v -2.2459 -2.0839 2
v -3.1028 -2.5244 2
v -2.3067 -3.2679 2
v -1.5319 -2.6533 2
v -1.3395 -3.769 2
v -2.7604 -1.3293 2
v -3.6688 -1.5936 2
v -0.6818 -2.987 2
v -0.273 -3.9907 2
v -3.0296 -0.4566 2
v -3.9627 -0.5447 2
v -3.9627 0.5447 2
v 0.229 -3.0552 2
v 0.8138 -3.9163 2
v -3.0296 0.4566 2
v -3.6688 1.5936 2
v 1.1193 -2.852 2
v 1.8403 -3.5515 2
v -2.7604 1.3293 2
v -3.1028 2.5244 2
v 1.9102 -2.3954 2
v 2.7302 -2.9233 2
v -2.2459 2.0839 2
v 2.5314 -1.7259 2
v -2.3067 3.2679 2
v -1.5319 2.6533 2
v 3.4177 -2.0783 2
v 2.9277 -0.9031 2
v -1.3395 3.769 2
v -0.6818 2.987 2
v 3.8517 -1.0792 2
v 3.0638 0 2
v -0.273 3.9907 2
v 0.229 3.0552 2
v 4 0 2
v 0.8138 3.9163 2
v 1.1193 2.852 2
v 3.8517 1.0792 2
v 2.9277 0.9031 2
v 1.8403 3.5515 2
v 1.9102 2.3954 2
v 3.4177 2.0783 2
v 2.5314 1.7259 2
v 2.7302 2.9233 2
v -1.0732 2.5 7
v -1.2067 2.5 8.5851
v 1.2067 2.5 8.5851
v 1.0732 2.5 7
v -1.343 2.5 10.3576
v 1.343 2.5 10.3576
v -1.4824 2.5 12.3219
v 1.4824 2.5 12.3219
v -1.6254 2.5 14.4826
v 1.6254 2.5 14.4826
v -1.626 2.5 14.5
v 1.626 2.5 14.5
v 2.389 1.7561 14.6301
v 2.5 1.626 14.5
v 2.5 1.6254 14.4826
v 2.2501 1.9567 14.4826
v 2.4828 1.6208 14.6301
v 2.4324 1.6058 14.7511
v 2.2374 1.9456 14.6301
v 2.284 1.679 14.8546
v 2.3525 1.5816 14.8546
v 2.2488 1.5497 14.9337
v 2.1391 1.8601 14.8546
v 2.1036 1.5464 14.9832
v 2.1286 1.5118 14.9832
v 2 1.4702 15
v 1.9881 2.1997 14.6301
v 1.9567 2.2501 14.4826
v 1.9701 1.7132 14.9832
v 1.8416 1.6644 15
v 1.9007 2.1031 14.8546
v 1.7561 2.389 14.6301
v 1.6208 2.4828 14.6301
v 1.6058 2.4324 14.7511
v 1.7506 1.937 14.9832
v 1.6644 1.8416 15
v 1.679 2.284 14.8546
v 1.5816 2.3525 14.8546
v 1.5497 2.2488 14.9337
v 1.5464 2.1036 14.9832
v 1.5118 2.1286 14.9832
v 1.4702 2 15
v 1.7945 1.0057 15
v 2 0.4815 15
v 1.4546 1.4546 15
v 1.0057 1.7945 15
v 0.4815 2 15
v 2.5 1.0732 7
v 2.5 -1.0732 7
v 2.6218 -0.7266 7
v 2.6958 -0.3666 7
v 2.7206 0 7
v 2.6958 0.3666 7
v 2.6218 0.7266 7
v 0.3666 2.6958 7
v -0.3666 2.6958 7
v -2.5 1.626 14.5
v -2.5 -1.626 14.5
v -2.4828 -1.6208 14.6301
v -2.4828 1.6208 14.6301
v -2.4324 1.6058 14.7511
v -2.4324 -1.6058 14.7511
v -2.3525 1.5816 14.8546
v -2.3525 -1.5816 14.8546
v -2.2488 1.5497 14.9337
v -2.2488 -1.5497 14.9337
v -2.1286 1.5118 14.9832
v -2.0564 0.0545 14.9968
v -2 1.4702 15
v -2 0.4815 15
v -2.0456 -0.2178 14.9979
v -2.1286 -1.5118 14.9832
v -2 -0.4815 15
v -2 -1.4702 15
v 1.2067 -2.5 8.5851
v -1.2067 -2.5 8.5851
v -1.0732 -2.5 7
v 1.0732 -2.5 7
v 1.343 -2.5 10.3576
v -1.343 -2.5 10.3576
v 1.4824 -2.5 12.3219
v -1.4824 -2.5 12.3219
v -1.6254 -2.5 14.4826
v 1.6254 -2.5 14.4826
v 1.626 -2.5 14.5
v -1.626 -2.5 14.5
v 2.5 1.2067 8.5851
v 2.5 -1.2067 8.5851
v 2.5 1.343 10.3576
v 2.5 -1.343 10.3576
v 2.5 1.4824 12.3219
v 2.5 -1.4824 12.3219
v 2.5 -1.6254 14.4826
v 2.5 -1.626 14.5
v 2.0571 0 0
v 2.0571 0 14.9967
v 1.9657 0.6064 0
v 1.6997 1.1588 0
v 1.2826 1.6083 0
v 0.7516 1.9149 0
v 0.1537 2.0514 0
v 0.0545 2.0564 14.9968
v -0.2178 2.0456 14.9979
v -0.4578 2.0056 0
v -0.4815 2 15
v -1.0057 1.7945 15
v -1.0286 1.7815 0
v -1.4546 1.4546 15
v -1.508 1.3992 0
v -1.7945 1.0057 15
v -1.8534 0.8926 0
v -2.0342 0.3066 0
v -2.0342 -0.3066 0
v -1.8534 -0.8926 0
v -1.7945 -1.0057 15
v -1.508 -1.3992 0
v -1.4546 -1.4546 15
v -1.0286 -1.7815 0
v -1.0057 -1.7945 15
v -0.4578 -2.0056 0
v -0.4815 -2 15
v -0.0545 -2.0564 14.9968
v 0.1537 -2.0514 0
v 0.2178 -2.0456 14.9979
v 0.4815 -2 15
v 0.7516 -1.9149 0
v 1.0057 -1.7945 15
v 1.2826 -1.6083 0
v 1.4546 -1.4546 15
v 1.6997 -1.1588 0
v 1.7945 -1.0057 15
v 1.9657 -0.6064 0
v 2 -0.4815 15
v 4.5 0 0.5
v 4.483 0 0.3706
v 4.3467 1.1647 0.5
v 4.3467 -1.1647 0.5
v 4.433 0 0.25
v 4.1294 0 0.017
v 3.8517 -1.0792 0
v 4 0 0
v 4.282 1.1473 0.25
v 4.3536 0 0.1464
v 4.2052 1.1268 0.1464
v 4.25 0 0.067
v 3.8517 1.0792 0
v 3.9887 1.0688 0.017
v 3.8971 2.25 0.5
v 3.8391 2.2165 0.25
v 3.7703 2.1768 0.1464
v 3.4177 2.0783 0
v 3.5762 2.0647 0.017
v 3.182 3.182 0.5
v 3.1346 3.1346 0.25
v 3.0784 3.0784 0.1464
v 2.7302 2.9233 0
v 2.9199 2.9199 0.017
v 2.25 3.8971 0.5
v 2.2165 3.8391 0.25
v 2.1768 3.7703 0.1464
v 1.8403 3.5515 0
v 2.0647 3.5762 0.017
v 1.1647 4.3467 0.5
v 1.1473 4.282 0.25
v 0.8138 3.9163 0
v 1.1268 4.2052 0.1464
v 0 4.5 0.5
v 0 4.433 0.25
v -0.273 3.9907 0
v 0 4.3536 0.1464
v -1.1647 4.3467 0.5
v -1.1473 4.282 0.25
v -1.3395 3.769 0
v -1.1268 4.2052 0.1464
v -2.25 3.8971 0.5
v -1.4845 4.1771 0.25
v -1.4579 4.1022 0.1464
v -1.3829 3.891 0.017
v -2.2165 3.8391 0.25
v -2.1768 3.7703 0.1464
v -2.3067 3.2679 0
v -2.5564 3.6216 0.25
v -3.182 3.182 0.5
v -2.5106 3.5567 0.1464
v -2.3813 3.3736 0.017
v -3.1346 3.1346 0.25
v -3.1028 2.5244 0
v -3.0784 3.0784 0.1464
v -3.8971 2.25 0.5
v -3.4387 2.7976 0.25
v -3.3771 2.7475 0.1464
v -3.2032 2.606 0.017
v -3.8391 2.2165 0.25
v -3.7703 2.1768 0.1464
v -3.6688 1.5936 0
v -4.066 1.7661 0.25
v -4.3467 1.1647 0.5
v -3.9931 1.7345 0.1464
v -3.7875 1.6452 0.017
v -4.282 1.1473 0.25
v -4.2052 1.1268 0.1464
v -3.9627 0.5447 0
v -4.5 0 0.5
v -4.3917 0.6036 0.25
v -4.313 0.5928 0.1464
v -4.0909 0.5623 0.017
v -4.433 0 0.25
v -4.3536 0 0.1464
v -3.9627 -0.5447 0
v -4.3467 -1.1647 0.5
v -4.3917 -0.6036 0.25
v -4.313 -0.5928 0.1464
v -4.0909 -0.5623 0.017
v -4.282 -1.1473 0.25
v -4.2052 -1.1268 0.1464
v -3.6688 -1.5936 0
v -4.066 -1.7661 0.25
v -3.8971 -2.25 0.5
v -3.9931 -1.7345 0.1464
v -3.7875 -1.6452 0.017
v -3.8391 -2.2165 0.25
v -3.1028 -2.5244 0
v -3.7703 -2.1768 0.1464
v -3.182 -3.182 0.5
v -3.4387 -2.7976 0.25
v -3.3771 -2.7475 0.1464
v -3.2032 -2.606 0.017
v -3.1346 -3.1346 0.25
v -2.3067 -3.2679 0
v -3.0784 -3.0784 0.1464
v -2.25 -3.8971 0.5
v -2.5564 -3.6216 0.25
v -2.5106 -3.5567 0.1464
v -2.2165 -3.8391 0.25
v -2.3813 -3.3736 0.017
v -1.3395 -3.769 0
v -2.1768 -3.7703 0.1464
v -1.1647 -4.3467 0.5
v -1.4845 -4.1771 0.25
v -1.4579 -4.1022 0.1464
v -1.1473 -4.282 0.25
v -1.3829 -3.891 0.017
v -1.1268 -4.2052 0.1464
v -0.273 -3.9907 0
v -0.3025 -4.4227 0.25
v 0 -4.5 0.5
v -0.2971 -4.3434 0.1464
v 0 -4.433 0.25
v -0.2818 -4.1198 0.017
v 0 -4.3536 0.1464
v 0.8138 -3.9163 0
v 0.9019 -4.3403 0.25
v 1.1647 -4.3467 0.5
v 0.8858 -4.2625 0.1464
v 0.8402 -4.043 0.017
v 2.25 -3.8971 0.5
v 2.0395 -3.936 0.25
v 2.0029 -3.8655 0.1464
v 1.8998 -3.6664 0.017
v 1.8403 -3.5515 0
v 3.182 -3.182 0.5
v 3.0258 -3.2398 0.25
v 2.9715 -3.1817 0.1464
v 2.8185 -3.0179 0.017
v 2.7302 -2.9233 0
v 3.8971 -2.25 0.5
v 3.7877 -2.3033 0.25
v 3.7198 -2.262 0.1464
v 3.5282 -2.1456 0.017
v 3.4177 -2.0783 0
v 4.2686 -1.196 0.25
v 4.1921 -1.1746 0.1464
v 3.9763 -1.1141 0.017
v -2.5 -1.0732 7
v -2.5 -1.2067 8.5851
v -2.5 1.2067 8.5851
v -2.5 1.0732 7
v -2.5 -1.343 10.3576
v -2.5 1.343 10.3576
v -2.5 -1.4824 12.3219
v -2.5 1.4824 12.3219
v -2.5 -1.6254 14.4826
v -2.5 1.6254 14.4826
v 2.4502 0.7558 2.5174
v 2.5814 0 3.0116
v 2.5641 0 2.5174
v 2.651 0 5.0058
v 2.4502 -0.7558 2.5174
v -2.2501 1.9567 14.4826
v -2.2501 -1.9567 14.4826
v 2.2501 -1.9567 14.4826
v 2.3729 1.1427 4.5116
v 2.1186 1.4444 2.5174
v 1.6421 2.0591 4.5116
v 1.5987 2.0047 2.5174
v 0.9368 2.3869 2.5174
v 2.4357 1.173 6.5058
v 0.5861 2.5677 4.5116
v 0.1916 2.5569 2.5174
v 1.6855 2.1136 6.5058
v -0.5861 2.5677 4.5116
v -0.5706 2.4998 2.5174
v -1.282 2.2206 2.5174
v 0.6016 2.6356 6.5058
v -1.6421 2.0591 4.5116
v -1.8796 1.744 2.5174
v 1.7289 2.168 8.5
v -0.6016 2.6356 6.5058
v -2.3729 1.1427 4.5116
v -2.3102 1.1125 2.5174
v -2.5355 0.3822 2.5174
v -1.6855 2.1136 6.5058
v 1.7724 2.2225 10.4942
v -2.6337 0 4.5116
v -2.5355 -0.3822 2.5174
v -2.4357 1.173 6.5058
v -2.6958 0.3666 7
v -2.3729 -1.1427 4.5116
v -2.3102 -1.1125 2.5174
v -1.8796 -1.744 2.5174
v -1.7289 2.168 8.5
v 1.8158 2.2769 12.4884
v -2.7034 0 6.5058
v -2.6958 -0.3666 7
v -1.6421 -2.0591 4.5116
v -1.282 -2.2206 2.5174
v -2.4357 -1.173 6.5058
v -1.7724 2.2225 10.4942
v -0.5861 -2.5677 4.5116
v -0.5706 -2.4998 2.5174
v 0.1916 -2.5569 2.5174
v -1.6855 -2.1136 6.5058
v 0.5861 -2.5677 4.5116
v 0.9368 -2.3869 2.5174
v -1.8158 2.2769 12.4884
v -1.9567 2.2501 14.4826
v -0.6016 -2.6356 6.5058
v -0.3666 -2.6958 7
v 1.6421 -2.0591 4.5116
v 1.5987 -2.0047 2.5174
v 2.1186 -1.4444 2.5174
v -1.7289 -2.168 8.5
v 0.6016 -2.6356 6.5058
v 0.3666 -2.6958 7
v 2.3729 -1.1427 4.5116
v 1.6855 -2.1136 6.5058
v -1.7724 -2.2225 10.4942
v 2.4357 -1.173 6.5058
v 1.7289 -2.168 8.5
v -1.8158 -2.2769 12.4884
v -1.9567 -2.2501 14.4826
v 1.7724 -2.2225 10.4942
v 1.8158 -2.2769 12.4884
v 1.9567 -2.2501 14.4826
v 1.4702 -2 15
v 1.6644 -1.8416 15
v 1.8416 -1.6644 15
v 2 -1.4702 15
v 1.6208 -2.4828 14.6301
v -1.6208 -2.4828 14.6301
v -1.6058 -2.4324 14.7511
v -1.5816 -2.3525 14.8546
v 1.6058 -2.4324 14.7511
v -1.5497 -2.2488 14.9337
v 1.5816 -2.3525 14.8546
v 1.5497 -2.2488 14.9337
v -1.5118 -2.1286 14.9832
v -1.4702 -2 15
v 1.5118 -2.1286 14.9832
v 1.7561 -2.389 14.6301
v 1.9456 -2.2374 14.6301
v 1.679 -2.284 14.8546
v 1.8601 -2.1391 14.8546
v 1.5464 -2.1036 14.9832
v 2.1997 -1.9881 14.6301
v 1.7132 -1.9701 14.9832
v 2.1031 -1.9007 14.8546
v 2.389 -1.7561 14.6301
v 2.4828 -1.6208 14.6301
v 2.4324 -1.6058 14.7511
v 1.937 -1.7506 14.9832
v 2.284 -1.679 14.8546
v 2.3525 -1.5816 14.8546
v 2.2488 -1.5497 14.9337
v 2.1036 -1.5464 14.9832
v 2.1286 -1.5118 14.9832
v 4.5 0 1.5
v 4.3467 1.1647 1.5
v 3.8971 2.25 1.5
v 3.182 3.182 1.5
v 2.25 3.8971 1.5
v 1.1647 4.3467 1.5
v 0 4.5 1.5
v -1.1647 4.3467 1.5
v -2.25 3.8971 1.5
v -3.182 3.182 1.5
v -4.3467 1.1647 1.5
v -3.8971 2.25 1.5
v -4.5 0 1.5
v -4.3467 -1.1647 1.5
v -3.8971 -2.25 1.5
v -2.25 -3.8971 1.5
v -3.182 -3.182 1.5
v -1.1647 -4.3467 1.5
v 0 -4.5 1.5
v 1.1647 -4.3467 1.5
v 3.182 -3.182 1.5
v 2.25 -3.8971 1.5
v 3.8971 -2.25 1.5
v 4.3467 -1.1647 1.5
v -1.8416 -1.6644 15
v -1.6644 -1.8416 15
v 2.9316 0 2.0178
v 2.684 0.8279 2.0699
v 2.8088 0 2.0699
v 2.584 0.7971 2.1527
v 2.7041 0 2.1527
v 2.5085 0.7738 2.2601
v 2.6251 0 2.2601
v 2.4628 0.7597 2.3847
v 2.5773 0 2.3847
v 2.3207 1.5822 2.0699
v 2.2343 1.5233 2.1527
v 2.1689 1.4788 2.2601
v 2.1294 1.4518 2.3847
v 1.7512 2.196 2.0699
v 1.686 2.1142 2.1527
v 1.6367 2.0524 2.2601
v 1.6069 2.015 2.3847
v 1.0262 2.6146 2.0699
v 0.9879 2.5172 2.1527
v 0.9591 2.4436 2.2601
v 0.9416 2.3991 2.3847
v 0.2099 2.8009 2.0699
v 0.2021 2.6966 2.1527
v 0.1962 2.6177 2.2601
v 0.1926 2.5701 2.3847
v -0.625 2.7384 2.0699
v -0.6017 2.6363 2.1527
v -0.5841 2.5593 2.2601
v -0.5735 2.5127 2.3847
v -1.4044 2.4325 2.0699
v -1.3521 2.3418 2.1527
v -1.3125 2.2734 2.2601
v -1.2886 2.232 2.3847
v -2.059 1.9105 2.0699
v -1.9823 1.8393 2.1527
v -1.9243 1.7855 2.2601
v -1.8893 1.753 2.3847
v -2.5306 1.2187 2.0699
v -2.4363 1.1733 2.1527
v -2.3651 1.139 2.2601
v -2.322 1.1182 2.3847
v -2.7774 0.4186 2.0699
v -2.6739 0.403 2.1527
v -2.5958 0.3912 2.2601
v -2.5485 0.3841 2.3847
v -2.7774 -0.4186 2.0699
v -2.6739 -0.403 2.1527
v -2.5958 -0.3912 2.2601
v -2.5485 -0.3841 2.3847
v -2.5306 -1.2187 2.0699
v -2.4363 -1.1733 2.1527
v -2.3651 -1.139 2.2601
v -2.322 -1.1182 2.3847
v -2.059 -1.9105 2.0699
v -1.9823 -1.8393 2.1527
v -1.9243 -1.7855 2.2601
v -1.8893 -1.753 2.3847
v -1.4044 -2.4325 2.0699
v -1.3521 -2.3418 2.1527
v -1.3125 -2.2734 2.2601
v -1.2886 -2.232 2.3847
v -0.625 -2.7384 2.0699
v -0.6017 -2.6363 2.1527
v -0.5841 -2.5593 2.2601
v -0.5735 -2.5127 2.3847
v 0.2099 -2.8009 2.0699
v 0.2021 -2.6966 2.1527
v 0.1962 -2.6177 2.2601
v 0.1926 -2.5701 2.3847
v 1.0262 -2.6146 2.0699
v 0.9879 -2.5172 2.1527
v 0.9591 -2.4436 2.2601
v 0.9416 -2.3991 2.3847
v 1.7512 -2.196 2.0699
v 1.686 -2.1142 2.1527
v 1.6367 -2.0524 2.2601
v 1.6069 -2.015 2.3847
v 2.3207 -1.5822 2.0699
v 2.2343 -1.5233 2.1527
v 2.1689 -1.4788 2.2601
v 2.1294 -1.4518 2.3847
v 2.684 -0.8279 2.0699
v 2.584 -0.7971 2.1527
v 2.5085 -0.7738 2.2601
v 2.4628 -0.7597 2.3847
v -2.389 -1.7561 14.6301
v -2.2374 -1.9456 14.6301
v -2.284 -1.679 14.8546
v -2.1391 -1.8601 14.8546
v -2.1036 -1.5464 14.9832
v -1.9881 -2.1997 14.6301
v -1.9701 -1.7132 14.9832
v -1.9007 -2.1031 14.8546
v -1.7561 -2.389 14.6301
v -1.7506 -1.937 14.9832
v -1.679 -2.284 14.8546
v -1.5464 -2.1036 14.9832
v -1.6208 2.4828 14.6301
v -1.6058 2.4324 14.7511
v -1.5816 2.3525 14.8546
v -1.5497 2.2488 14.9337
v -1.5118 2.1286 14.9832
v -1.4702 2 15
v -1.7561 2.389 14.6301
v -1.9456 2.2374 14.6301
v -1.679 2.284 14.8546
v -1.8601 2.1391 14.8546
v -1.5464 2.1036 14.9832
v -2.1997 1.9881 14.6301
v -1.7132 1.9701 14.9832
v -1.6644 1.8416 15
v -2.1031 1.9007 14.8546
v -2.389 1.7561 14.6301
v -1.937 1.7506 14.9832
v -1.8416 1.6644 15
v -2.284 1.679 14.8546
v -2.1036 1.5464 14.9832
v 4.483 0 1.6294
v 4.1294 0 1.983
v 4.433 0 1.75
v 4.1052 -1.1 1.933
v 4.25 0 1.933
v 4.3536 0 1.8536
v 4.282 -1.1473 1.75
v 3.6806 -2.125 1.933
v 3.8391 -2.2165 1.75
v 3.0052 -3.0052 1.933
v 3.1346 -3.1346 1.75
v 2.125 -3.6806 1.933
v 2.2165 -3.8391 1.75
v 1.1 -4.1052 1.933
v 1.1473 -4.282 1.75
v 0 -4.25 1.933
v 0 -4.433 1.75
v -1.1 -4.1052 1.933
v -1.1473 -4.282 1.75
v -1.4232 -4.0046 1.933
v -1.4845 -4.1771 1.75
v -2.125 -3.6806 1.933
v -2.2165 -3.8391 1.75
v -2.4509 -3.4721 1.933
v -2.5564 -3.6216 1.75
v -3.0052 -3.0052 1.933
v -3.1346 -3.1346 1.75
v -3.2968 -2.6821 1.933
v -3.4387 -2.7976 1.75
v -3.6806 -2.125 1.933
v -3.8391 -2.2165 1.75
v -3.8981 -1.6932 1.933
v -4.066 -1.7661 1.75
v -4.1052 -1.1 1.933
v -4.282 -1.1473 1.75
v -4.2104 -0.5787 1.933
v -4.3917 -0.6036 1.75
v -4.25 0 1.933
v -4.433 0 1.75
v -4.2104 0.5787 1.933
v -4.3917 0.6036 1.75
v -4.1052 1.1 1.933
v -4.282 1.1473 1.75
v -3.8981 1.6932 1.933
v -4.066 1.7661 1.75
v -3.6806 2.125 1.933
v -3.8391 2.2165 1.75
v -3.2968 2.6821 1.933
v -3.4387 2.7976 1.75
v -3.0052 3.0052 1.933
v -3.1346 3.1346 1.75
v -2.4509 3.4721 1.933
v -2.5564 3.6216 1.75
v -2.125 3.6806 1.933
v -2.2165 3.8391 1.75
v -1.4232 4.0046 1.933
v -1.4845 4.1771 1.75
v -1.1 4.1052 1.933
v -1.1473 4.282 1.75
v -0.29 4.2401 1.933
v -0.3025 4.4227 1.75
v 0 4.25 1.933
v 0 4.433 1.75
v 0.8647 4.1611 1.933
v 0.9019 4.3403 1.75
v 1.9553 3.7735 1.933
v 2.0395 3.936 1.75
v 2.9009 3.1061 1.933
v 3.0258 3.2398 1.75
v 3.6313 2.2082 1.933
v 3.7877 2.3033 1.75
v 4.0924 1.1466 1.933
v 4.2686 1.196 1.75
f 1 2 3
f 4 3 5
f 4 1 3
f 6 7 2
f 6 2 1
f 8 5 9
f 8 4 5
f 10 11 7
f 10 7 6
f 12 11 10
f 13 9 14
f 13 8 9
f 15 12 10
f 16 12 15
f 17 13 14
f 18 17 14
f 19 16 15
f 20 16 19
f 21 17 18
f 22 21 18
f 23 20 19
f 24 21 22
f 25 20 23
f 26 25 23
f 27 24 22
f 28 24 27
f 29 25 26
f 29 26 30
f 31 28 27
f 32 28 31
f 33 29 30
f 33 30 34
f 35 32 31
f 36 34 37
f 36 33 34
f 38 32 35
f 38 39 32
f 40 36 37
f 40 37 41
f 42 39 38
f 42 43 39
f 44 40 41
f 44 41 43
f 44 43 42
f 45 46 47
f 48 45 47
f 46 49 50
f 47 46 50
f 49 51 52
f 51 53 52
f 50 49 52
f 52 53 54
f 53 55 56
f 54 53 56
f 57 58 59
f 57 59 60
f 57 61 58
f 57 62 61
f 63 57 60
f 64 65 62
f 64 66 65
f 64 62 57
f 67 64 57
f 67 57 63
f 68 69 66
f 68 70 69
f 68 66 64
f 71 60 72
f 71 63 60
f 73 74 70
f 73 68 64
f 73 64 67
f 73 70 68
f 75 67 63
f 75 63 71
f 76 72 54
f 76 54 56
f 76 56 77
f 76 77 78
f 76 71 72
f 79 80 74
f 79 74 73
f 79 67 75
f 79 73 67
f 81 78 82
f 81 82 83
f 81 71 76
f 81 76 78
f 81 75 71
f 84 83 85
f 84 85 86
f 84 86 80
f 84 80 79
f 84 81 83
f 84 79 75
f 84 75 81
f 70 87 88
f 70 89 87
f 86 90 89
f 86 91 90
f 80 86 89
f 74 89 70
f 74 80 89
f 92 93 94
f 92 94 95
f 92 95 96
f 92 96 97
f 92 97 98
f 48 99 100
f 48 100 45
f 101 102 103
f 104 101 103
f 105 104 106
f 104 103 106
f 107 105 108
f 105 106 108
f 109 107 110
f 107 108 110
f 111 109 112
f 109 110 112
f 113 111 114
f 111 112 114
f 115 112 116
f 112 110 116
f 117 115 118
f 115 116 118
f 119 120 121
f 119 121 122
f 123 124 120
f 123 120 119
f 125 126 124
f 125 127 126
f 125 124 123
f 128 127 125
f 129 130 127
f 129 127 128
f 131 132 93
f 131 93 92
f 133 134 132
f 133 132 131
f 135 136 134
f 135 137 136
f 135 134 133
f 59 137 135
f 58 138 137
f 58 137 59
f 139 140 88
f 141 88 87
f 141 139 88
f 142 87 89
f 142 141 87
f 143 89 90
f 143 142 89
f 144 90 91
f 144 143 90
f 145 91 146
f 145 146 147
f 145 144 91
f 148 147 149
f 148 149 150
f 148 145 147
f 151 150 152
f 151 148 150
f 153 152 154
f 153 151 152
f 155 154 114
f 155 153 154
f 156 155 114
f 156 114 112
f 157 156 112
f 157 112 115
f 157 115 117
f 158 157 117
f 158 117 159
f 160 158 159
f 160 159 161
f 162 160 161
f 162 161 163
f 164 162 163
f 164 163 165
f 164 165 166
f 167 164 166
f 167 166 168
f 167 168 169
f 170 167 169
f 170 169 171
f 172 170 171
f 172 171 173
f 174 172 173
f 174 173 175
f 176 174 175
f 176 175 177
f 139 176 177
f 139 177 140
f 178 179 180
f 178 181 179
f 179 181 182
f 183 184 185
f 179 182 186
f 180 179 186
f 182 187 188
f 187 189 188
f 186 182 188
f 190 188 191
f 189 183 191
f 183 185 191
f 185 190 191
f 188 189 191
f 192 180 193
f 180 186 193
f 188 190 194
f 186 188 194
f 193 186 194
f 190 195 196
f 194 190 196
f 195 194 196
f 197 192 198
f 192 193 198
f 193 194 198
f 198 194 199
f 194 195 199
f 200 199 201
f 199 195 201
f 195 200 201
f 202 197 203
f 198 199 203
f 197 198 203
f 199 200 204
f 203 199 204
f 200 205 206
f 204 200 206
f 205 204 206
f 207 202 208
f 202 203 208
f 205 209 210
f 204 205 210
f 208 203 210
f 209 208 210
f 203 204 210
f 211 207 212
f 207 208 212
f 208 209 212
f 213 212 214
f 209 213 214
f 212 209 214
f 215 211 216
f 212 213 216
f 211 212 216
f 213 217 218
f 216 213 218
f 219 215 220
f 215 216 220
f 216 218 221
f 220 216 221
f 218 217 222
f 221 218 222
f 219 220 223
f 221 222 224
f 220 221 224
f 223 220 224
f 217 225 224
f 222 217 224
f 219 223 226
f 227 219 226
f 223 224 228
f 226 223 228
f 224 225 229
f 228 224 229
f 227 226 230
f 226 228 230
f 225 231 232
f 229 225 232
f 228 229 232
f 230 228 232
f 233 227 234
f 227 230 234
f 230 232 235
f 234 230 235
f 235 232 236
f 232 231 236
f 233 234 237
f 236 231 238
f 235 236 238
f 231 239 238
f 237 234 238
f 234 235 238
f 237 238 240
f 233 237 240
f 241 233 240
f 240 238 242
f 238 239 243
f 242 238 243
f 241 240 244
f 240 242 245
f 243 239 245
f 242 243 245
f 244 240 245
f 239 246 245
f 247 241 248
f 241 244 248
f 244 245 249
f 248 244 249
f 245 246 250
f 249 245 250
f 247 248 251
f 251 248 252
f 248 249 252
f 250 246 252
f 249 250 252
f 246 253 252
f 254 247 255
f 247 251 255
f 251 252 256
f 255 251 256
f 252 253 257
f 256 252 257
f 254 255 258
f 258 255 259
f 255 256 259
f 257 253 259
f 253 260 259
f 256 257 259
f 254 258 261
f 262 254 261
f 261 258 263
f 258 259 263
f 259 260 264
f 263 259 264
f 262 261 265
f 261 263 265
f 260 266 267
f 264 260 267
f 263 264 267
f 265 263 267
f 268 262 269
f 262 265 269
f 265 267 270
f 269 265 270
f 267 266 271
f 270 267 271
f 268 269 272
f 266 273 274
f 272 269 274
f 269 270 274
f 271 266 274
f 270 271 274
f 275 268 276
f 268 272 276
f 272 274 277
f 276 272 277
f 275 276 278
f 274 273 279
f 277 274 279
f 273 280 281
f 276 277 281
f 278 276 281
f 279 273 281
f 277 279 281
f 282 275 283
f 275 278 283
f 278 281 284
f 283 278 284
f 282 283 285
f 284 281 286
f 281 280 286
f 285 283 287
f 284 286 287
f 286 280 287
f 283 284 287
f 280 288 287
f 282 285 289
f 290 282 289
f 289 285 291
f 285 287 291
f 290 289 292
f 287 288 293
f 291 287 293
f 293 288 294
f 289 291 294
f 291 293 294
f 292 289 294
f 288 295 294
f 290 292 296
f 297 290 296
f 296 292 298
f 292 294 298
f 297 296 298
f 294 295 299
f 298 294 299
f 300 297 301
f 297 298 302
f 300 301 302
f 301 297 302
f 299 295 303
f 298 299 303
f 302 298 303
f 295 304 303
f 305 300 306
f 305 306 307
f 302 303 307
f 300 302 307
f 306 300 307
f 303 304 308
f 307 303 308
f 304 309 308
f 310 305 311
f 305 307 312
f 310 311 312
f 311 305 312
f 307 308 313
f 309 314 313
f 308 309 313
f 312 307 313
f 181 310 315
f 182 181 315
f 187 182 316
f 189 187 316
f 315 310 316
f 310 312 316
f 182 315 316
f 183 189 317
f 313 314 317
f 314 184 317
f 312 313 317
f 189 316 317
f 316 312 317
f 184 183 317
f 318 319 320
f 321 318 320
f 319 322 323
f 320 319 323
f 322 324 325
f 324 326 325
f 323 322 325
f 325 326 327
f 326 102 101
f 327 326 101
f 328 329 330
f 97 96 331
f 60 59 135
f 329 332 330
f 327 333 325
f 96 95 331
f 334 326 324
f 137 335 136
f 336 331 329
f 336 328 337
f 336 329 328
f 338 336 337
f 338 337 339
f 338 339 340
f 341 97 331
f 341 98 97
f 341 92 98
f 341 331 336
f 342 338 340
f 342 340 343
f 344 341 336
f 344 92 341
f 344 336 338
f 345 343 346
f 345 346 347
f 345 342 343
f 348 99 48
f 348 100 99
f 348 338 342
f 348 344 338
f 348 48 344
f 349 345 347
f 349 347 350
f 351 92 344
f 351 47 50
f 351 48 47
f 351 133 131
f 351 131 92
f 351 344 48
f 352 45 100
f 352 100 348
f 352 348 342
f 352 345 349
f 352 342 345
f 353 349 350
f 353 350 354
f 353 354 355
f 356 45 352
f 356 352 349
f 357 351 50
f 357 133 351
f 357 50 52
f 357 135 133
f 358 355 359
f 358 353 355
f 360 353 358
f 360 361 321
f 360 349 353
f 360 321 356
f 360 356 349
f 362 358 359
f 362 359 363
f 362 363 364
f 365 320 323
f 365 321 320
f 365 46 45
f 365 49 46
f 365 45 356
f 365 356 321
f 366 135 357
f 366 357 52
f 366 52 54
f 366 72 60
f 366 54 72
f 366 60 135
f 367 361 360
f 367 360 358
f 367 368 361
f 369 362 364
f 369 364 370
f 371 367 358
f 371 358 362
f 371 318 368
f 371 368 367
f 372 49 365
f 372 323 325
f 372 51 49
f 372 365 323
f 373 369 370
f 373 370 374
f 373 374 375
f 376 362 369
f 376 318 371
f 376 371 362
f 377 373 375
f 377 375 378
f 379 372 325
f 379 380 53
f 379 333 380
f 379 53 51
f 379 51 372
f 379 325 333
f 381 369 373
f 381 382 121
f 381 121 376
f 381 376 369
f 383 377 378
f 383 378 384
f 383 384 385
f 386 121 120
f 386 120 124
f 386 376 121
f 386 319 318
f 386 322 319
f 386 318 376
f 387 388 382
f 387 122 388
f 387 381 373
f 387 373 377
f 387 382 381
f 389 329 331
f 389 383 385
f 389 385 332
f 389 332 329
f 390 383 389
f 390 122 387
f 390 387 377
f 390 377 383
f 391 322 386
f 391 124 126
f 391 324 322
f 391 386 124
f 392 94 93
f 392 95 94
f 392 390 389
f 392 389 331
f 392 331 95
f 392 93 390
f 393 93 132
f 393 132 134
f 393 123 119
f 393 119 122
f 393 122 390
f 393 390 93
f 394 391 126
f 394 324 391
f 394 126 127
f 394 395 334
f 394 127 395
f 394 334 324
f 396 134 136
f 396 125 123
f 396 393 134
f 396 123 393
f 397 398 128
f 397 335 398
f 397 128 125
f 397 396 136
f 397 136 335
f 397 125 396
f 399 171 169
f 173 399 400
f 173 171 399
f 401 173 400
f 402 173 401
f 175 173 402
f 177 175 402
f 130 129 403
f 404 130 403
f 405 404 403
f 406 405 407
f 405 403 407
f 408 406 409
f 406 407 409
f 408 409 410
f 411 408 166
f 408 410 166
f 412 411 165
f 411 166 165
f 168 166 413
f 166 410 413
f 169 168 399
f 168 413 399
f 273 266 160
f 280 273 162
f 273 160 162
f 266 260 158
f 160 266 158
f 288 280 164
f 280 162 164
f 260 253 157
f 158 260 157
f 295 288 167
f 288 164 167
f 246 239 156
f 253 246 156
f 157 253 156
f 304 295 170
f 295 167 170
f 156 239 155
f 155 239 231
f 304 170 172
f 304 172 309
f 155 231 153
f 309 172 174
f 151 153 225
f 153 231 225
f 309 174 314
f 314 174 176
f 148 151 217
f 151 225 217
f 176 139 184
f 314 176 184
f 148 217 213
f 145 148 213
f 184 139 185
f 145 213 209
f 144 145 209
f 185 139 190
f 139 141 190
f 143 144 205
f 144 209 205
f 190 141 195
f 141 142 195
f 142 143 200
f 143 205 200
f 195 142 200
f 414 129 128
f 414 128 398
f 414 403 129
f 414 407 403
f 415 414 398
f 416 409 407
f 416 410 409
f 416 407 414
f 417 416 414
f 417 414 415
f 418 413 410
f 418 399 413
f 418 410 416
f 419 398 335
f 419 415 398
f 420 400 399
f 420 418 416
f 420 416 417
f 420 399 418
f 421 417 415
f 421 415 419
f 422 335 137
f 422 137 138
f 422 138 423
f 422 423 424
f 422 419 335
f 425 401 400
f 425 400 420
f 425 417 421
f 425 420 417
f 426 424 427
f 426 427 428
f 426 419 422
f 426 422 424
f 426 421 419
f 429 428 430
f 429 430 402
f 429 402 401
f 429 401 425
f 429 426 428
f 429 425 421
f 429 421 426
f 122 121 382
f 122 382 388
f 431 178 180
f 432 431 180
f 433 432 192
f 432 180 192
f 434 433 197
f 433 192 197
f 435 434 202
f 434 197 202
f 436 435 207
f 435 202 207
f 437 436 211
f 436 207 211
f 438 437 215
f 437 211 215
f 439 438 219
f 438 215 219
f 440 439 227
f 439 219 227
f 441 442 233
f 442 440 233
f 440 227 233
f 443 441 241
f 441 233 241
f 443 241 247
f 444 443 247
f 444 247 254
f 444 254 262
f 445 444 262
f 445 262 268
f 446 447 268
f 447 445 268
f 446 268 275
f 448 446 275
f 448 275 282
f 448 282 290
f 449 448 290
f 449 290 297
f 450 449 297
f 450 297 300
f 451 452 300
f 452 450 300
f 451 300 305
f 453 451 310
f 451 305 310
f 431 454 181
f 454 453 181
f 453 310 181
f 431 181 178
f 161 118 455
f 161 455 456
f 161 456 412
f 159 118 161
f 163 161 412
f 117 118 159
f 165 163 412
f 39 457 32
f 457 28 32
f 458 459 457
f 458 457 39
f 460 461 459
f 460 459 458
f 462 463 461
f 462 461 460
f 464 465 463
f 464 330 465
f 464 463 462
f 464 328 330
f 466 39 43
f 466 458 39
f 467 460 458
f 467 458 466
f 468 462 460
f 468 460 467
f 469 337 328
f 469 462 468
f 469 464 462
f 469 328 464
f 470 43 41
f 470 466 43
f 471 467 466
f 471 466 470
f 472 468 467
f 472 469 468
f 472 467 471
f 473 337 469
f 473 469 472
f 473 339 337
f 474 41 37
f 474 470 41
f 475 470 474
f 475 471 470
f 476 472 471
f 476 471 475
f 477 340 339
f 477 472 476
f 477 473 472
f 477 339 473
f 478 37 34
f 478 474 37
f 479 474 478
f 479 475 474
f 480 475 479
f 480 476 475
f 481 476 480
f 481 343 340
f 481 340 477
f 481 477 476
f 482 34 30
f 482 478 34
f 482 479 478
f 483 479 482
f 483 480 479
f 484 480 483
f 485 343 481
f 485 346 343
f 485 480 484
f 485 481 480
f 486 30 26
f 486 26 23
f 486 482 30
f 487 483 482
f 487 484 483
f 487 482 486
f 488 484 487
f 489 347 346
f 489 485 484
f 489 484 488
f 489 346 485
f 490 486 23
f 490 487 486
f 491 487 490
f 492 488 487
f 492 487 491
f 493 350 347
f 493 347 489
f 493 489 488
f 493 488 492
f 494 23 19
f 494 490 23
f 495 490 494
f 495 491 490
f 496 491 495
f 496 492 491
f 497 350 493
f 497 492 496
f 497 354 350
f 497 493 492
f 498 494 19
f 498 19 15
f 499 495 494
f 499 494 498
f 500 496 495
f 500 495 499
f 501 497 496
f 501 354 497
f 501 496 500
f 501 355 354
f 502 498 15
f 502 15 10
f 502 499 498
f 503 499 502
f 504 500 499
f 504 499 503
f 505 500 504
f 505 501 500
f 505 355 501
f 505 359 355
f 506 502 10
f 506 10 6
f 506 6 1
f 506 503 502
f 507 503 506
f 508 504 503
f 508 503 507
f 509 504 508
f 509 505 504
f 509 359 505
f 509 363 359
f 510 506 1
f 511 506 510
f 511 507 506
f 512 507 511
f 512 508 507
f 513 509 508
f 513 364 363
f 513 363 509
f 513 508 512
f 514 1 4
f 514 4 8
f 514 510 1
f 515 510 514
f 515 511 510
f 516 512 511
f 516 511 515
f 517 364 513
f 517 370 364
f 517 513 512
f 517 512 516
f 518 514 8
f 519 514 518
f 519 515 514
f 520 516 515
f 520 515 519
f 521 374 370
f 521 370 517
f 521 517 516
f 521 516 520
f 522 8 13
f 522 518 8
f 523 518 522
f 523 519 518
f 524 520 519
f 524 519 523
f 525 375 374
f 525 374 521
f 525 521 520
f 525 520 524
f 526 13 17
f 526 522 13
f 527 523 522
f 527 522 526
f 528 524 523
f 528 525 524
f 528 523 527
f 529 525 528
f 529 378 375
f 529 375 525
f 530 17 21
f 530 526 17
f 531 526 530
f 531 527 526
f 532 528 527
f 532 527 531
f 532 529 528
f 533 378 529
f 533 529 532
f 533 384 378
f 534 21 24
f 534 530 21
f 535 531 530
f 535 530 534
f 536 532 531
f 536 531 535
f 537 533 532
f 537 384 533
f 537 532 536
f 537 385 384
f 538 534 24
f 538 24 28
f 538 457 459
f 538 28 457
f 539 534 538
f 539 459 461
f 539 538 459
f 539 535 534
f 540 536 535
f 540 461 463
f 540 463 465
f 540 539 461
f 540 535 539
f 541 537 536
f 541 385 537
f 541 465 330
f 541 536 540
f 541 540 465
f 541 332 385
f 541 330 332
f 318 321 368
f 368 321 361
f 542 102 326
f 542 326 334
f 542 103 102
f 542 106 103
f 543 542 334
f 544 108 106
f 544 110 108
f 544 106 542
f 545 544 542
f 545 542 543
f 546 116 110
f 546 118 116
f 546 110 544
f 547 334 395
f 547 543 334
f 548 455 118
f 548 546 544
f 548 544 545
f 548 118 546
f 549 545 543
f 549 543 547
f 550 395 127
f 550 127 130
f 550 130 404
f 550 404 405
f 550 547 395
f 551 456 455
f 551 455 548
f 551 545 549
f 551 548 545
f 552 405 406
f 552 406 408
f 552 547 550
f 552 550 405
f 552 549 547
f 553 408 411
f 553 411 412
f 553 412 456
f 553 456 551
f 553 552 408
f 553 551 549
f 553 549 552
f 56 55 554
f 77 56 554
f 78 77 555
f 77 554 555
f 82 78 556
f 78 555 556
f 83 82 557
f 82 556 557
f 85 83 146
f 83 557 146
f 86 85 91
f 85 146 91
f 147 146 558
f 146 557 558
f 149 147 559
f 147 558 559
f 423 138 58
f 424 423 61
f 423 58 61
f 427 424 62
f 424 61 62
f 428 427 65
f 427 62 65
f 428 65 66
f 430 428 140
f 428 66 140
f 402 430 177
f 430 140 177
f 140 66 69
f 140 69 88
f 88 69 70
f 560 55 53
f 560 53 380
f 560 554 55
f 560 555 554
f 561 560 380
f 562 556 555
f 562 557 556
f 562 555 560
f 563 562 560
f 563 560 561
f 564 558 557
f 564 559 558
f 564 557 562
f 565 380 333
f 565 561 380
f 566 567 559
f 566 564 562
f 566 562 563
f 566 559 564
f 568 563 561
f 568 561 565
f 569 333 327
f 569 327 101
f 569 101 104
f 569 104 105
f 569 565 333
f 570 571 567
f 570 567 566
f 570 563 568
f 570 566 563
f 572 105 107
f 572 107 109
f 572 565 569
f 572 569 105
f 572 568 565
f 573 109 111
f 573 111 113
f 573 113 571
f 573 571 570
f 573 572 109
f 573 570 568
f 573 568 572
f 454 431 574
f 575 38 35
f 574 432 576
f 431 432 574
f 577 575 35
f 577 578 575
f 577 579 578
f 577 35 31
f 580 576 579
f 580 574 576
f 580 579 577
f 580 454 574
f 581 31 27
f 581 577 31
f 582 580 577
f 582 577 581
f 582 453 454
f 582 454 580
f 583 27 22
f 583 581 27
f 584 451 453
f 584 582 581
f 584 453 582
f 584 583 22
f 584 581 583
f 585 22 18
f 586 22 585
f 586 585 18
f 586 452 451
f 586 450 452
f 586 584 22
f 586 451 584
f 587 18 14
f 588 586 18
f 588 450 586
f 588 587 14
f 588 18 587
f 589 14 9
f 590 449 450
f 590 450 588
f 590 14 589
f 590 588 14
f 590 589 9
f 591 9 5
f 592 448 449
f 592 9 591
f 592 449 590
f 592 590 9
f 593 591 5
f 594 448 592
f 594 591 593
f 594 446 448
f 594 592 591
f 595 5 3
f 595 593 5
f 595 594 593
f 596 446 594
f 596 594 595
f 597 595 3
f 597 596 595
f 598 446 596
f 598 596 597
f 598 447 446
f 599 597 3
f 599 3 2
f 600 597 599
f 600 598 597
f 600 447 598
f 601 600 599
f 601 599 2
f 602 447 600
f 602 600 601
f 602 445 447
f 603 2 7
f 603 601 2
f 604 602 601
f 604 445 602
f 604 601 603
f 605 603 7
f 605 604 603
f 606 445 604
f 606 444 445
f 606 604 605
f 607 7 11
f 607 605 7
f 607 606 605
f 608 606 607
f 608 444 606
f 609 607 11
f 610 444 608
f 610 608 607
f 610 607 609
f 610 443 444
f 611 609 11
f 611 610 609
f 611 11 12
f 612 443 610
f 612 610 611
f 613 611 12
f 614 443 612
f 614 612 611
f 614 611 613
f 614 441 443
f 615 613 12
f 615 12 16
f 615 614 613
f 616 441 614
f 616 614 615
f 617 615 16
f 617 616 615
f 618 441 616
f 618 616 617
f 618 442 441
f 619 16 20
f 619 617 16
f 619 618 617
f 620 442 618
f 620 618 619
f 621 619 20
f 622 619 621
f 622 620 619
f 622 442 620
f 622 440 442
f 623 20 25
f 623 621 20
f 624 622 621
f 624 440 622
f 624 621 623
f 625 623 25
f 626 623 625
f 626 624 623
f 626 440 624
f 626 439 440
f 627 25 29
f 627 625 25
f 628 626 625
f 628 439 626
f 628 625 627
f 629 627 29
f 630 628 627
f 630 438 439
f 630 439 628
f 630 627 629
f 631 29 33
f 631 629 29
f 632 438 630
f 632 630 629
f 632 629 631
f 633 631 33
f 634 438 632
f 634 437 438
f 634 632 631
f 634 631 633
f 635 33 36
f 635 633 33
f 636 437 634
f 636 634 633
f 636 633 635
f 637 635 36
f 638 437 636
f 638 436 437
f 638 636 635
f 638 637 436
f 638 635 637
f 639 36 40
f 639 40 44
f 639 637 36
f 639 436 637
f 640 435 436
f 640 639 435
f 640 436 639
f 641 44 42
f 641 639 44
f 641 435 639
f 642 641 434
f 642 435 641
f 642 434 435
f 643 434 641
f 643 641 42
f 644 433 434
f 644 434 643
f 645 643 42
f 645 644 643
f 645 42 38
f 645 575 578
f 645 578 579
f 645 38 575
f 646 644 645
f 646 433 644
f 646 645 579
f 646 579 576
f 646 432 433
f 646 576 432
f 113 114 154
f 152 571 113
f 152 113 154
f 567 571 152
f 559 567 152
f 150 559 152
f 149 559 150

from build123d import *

# Parameters (mm, degrees)
SKETCH_1_R           = 4.5
SKETCH_1_R_2         = 2.057142857
EXTRUDE_1_DEPTH      = 15
SKETCH_2_OUTSIDE_W   = 15.842
SKETCH_2_OUTSIDE_H   = 15.842
SKETCH_2_OUTSIDE_R   = 3
CUT_EXTRUDE_1_DEPTH  = 13
CUT_EXTRUDE_1_DRAFT  = 2
SKETCH_3_OUTSIDE_W   = 14.934
SKETCH_3_OUTSIDE_H   = 14.934
SKETCH_3_OUTSIDE_W_2 = 5
SKETCH_3_OUTSIDE_H_2 = 5
CUT_EXTRUDE_2_DEPTH  = 8
FILLET_2_R           = 0.5
FILLET_3_R           = 0.5
FILLET_4_R           = 0.5
FILLET_5_R           = 0.5


with BuildPart() as part:
    # Эскиз1 → Бобышка-Вытянуть1 (new body)
    with BuildSketch(Plane.XY):
        Circle(SKETCH_1_R)
        Circle(SKETCH_1_R_2, mode=Mode.SUBTRACT)
    extrude(amount=EXTRUDE_1_DEPTH)


with BuildPart() as cut_extrude_1_tool:
    # Эскиз2 outside → Вырез-Вытянуть1 (with draft: the straight prism first)
    with BuildSketch(Plane.XY.offset(15)):
        Rectangle(SKETCH_2_OUTSIDE_W, SKETCH_2_OUTSIDE_H)
        Circle(SKETCH_2_OUTSIDE_R, mode=Mode.SUBTRACT)
    extrude(amount=-CUT_EXTRUDE_1_DEPTH)
    # Вырез-Вытянуть1: the draft: its side faces are tilted about the plane it starts from
    cut_extrude_1_sides = [cut_extrude_1_tool.faces().sort_by_distance(p)[0] for p in [
        (0, -7.921, 8.5),
        (7.921, 0, 8.5),
        (0, 7.921, 8.5),
        (-7.921, 0, 8.5),
        (-3, 0, 8.5),
    ]]
    draft(cut_extrude_1_sides, Plane.XY.offset(15), CUT_EXTRUDE_1_DRAFT)


with BuildPart() as part_1:
    add(part.part)

    # Вырез-Вытянуть1: cut by cut_extrude_1_tool
    add(cut_extrude_1_tool.part, mode=Mode.SUBTRACT)

    # Эскиз3 outside → Вырез-Вытянуть2 (cut)
    with BuildSketch(Plane.XY.offset(15)):
        Rectangle(SKETCH_3_OUTSIDE_W, SKETCH_3_OUTSIDE_H)
        Rectangle(SKETCH_3_OUTSIDE_W_2, SKETCH_3_OUTSIDE_H_2, mode=Mode.SUBTRACT)
    extrude(amount=-CUT_EXTRUDE_2_DEPTH, mode=Mode.SUBTRACT)

    # Скругление2
    # the kernel refuses this fillet: 0.5 mm, written as the material it takes off along each edge
    with BuildSketch(Plane(origin=(0, 0, 15), x_dir=(0.9881342002725989, 0.15359297591892496, 0), z_dir=(0.15359297591892496, -0.9881342002725989, 0))) as fillet_2_piece_1:
        with BuildLine():
            CenterArc((3 - FILLET_2_R * 1.03553031379, -FILLET_2_R), FILLET_2_R, 358, 92)
            Line((3 - FILLET_2_R * 1.03553031379, 0), (3, 0))
            Line((3, 0), (3 - FILLET_2_R * 0.0361394867715, -FILLET_2_R * 1.0348994967))
        make_face()
    revolve(axis=Axis((0, 0, 15), (0, 0, 1)), revolution_arc=72.329594827, mode=Mode.SUBTRACT)
    with BuildSketch(Plane(origin=(0, 0, 15), x_dir=(-0.1535929759189553, 0.9881342002725941, 0), z_dir=(0.9881342002725941, 0.1535929759189553, 0))) as fillet_2_piece_2:
        with BuildLine():
            CenterArc((3 - FILLET_2_R * 1.03553031379, -FILLET_2_R), FILLET_2_R, 358, 92)
            Line((3 - FILLET_2_R * 1.03553031379, 0), (3, 0))
            Line((3, 0), (3 - FILLET_2_R * 0.0361394867715, -FILLET_2_R * 1.0348994967))
        make_face()
    revolve(axis=Axis((0, 0, 15), (0, 0, 1)), revolution_arc=72.329594827, mode=Mode.SUBTRACT)
    with BuildSketch(Plane(origin=(0, 0, 15), x_dir=(-0.9881342002725968, -0.15359297591893833, 0), z_dir=(-0.15359297591893833, 0.9881342002725968, 0))) as fillet_2_piece_3:
        with BuildLine():
            CenterArc((3 - FILLET_2_R * 1.03553031379, -FILLET_2_R), FILLET_2_R, 358, 92)
            Line((3 - FILLET_2_R * 1.03553031379, 0), (3, 0))
            Line((3, 0), (3 - FILLET_2_R * 0.0361394867715, -FILLET_2_R * 1.0348994967))
        make_face()
    revolve(axis=Axis((0, 0, 15), (0, 0, 1)), revolution_arc=72.329594827, mode=Mode.SUBTRACT)
    with BuildSketch(Plane(origin=(0, 0, 15), x_dir=(0.15359297591892515, -0.9881342002725989, 0), z_dir=(-0.9881342002725989, -0.15359297591892515, 0))) as fillet_2_piece_4:
        with BuildLine():
            CenterArc((3 - FILLET_2_R * 1.03553031379, -FILLET_2_R), FILLET_2_R, 358, 92)
            Line((3 - FILLET_2_R * 1.03553031379, 0), (3, 0))
            Line((3, 0), (3 - FILLET_2_R * 0.0361394867715, -FILLET_2_R * 1.0348994967))
        make_face()
    revolve(axis=Axis((0, 0, 15), (0, 0, 1)), revolution_arc=72.329594827, mode=Mode.SUBTRACT)
    with BuildSketch(Plane(origin=(2.5, 2.908312395, 15), x_dir=(-1, 0, 0), z_dir=(0, -1, 0)), Plane(origin=(2.908312395, -2.5, 15), x_dir=(0, 1, 0), z_dir=(-1, 0, 0)), Plane(origin=(-2.5, -2.908312395, 15), x_dir=(1, 0, 0), z_dir=(0, 1, 0)), Plane(origin=(-2.908312395, 2.5, 15), x_dir=(0, -1, 0), z_dir=(1, 0, 0))) as fillet_2_piece_5:
        with BuildLine():
            CenterArc((FILLET_2_R, FILLET_2_R), FILLET_2_R, 180, 90)
            Line((0, FILLET_2_R), (0, 0))
            Line((0, 0), (FILLET_2_R, 0))
        make_face()
    extrude(amount=5.81662479, mode=Mode.SUBTRACT)

    # Скругление3
    fillet_3_edges = [part_1.edges().sort_by_distance(p)[0] for p in [
        (-2.546029997, 0, 2),
    ]]
    fillet(fillet_3_edges, radius=FILLET_3_R)

    # Скругление4
    fillet_4_edges = [part_1.edges().sort_by_distance(p)[0] for p in [
        (-4.5, 0, 2),
    ]]
    fillet(fillet_4_edges, radius=FILLET_4_R)

    # Скругление5
    fillet_5_edges = [part_1.edges().sort_by_distance(p)[0] for p in [
        (-4.5, 0, 0),
    ]]
    fillet(fillet_5_edges, radius=FILLET_5_R)


solid = part_1.part
